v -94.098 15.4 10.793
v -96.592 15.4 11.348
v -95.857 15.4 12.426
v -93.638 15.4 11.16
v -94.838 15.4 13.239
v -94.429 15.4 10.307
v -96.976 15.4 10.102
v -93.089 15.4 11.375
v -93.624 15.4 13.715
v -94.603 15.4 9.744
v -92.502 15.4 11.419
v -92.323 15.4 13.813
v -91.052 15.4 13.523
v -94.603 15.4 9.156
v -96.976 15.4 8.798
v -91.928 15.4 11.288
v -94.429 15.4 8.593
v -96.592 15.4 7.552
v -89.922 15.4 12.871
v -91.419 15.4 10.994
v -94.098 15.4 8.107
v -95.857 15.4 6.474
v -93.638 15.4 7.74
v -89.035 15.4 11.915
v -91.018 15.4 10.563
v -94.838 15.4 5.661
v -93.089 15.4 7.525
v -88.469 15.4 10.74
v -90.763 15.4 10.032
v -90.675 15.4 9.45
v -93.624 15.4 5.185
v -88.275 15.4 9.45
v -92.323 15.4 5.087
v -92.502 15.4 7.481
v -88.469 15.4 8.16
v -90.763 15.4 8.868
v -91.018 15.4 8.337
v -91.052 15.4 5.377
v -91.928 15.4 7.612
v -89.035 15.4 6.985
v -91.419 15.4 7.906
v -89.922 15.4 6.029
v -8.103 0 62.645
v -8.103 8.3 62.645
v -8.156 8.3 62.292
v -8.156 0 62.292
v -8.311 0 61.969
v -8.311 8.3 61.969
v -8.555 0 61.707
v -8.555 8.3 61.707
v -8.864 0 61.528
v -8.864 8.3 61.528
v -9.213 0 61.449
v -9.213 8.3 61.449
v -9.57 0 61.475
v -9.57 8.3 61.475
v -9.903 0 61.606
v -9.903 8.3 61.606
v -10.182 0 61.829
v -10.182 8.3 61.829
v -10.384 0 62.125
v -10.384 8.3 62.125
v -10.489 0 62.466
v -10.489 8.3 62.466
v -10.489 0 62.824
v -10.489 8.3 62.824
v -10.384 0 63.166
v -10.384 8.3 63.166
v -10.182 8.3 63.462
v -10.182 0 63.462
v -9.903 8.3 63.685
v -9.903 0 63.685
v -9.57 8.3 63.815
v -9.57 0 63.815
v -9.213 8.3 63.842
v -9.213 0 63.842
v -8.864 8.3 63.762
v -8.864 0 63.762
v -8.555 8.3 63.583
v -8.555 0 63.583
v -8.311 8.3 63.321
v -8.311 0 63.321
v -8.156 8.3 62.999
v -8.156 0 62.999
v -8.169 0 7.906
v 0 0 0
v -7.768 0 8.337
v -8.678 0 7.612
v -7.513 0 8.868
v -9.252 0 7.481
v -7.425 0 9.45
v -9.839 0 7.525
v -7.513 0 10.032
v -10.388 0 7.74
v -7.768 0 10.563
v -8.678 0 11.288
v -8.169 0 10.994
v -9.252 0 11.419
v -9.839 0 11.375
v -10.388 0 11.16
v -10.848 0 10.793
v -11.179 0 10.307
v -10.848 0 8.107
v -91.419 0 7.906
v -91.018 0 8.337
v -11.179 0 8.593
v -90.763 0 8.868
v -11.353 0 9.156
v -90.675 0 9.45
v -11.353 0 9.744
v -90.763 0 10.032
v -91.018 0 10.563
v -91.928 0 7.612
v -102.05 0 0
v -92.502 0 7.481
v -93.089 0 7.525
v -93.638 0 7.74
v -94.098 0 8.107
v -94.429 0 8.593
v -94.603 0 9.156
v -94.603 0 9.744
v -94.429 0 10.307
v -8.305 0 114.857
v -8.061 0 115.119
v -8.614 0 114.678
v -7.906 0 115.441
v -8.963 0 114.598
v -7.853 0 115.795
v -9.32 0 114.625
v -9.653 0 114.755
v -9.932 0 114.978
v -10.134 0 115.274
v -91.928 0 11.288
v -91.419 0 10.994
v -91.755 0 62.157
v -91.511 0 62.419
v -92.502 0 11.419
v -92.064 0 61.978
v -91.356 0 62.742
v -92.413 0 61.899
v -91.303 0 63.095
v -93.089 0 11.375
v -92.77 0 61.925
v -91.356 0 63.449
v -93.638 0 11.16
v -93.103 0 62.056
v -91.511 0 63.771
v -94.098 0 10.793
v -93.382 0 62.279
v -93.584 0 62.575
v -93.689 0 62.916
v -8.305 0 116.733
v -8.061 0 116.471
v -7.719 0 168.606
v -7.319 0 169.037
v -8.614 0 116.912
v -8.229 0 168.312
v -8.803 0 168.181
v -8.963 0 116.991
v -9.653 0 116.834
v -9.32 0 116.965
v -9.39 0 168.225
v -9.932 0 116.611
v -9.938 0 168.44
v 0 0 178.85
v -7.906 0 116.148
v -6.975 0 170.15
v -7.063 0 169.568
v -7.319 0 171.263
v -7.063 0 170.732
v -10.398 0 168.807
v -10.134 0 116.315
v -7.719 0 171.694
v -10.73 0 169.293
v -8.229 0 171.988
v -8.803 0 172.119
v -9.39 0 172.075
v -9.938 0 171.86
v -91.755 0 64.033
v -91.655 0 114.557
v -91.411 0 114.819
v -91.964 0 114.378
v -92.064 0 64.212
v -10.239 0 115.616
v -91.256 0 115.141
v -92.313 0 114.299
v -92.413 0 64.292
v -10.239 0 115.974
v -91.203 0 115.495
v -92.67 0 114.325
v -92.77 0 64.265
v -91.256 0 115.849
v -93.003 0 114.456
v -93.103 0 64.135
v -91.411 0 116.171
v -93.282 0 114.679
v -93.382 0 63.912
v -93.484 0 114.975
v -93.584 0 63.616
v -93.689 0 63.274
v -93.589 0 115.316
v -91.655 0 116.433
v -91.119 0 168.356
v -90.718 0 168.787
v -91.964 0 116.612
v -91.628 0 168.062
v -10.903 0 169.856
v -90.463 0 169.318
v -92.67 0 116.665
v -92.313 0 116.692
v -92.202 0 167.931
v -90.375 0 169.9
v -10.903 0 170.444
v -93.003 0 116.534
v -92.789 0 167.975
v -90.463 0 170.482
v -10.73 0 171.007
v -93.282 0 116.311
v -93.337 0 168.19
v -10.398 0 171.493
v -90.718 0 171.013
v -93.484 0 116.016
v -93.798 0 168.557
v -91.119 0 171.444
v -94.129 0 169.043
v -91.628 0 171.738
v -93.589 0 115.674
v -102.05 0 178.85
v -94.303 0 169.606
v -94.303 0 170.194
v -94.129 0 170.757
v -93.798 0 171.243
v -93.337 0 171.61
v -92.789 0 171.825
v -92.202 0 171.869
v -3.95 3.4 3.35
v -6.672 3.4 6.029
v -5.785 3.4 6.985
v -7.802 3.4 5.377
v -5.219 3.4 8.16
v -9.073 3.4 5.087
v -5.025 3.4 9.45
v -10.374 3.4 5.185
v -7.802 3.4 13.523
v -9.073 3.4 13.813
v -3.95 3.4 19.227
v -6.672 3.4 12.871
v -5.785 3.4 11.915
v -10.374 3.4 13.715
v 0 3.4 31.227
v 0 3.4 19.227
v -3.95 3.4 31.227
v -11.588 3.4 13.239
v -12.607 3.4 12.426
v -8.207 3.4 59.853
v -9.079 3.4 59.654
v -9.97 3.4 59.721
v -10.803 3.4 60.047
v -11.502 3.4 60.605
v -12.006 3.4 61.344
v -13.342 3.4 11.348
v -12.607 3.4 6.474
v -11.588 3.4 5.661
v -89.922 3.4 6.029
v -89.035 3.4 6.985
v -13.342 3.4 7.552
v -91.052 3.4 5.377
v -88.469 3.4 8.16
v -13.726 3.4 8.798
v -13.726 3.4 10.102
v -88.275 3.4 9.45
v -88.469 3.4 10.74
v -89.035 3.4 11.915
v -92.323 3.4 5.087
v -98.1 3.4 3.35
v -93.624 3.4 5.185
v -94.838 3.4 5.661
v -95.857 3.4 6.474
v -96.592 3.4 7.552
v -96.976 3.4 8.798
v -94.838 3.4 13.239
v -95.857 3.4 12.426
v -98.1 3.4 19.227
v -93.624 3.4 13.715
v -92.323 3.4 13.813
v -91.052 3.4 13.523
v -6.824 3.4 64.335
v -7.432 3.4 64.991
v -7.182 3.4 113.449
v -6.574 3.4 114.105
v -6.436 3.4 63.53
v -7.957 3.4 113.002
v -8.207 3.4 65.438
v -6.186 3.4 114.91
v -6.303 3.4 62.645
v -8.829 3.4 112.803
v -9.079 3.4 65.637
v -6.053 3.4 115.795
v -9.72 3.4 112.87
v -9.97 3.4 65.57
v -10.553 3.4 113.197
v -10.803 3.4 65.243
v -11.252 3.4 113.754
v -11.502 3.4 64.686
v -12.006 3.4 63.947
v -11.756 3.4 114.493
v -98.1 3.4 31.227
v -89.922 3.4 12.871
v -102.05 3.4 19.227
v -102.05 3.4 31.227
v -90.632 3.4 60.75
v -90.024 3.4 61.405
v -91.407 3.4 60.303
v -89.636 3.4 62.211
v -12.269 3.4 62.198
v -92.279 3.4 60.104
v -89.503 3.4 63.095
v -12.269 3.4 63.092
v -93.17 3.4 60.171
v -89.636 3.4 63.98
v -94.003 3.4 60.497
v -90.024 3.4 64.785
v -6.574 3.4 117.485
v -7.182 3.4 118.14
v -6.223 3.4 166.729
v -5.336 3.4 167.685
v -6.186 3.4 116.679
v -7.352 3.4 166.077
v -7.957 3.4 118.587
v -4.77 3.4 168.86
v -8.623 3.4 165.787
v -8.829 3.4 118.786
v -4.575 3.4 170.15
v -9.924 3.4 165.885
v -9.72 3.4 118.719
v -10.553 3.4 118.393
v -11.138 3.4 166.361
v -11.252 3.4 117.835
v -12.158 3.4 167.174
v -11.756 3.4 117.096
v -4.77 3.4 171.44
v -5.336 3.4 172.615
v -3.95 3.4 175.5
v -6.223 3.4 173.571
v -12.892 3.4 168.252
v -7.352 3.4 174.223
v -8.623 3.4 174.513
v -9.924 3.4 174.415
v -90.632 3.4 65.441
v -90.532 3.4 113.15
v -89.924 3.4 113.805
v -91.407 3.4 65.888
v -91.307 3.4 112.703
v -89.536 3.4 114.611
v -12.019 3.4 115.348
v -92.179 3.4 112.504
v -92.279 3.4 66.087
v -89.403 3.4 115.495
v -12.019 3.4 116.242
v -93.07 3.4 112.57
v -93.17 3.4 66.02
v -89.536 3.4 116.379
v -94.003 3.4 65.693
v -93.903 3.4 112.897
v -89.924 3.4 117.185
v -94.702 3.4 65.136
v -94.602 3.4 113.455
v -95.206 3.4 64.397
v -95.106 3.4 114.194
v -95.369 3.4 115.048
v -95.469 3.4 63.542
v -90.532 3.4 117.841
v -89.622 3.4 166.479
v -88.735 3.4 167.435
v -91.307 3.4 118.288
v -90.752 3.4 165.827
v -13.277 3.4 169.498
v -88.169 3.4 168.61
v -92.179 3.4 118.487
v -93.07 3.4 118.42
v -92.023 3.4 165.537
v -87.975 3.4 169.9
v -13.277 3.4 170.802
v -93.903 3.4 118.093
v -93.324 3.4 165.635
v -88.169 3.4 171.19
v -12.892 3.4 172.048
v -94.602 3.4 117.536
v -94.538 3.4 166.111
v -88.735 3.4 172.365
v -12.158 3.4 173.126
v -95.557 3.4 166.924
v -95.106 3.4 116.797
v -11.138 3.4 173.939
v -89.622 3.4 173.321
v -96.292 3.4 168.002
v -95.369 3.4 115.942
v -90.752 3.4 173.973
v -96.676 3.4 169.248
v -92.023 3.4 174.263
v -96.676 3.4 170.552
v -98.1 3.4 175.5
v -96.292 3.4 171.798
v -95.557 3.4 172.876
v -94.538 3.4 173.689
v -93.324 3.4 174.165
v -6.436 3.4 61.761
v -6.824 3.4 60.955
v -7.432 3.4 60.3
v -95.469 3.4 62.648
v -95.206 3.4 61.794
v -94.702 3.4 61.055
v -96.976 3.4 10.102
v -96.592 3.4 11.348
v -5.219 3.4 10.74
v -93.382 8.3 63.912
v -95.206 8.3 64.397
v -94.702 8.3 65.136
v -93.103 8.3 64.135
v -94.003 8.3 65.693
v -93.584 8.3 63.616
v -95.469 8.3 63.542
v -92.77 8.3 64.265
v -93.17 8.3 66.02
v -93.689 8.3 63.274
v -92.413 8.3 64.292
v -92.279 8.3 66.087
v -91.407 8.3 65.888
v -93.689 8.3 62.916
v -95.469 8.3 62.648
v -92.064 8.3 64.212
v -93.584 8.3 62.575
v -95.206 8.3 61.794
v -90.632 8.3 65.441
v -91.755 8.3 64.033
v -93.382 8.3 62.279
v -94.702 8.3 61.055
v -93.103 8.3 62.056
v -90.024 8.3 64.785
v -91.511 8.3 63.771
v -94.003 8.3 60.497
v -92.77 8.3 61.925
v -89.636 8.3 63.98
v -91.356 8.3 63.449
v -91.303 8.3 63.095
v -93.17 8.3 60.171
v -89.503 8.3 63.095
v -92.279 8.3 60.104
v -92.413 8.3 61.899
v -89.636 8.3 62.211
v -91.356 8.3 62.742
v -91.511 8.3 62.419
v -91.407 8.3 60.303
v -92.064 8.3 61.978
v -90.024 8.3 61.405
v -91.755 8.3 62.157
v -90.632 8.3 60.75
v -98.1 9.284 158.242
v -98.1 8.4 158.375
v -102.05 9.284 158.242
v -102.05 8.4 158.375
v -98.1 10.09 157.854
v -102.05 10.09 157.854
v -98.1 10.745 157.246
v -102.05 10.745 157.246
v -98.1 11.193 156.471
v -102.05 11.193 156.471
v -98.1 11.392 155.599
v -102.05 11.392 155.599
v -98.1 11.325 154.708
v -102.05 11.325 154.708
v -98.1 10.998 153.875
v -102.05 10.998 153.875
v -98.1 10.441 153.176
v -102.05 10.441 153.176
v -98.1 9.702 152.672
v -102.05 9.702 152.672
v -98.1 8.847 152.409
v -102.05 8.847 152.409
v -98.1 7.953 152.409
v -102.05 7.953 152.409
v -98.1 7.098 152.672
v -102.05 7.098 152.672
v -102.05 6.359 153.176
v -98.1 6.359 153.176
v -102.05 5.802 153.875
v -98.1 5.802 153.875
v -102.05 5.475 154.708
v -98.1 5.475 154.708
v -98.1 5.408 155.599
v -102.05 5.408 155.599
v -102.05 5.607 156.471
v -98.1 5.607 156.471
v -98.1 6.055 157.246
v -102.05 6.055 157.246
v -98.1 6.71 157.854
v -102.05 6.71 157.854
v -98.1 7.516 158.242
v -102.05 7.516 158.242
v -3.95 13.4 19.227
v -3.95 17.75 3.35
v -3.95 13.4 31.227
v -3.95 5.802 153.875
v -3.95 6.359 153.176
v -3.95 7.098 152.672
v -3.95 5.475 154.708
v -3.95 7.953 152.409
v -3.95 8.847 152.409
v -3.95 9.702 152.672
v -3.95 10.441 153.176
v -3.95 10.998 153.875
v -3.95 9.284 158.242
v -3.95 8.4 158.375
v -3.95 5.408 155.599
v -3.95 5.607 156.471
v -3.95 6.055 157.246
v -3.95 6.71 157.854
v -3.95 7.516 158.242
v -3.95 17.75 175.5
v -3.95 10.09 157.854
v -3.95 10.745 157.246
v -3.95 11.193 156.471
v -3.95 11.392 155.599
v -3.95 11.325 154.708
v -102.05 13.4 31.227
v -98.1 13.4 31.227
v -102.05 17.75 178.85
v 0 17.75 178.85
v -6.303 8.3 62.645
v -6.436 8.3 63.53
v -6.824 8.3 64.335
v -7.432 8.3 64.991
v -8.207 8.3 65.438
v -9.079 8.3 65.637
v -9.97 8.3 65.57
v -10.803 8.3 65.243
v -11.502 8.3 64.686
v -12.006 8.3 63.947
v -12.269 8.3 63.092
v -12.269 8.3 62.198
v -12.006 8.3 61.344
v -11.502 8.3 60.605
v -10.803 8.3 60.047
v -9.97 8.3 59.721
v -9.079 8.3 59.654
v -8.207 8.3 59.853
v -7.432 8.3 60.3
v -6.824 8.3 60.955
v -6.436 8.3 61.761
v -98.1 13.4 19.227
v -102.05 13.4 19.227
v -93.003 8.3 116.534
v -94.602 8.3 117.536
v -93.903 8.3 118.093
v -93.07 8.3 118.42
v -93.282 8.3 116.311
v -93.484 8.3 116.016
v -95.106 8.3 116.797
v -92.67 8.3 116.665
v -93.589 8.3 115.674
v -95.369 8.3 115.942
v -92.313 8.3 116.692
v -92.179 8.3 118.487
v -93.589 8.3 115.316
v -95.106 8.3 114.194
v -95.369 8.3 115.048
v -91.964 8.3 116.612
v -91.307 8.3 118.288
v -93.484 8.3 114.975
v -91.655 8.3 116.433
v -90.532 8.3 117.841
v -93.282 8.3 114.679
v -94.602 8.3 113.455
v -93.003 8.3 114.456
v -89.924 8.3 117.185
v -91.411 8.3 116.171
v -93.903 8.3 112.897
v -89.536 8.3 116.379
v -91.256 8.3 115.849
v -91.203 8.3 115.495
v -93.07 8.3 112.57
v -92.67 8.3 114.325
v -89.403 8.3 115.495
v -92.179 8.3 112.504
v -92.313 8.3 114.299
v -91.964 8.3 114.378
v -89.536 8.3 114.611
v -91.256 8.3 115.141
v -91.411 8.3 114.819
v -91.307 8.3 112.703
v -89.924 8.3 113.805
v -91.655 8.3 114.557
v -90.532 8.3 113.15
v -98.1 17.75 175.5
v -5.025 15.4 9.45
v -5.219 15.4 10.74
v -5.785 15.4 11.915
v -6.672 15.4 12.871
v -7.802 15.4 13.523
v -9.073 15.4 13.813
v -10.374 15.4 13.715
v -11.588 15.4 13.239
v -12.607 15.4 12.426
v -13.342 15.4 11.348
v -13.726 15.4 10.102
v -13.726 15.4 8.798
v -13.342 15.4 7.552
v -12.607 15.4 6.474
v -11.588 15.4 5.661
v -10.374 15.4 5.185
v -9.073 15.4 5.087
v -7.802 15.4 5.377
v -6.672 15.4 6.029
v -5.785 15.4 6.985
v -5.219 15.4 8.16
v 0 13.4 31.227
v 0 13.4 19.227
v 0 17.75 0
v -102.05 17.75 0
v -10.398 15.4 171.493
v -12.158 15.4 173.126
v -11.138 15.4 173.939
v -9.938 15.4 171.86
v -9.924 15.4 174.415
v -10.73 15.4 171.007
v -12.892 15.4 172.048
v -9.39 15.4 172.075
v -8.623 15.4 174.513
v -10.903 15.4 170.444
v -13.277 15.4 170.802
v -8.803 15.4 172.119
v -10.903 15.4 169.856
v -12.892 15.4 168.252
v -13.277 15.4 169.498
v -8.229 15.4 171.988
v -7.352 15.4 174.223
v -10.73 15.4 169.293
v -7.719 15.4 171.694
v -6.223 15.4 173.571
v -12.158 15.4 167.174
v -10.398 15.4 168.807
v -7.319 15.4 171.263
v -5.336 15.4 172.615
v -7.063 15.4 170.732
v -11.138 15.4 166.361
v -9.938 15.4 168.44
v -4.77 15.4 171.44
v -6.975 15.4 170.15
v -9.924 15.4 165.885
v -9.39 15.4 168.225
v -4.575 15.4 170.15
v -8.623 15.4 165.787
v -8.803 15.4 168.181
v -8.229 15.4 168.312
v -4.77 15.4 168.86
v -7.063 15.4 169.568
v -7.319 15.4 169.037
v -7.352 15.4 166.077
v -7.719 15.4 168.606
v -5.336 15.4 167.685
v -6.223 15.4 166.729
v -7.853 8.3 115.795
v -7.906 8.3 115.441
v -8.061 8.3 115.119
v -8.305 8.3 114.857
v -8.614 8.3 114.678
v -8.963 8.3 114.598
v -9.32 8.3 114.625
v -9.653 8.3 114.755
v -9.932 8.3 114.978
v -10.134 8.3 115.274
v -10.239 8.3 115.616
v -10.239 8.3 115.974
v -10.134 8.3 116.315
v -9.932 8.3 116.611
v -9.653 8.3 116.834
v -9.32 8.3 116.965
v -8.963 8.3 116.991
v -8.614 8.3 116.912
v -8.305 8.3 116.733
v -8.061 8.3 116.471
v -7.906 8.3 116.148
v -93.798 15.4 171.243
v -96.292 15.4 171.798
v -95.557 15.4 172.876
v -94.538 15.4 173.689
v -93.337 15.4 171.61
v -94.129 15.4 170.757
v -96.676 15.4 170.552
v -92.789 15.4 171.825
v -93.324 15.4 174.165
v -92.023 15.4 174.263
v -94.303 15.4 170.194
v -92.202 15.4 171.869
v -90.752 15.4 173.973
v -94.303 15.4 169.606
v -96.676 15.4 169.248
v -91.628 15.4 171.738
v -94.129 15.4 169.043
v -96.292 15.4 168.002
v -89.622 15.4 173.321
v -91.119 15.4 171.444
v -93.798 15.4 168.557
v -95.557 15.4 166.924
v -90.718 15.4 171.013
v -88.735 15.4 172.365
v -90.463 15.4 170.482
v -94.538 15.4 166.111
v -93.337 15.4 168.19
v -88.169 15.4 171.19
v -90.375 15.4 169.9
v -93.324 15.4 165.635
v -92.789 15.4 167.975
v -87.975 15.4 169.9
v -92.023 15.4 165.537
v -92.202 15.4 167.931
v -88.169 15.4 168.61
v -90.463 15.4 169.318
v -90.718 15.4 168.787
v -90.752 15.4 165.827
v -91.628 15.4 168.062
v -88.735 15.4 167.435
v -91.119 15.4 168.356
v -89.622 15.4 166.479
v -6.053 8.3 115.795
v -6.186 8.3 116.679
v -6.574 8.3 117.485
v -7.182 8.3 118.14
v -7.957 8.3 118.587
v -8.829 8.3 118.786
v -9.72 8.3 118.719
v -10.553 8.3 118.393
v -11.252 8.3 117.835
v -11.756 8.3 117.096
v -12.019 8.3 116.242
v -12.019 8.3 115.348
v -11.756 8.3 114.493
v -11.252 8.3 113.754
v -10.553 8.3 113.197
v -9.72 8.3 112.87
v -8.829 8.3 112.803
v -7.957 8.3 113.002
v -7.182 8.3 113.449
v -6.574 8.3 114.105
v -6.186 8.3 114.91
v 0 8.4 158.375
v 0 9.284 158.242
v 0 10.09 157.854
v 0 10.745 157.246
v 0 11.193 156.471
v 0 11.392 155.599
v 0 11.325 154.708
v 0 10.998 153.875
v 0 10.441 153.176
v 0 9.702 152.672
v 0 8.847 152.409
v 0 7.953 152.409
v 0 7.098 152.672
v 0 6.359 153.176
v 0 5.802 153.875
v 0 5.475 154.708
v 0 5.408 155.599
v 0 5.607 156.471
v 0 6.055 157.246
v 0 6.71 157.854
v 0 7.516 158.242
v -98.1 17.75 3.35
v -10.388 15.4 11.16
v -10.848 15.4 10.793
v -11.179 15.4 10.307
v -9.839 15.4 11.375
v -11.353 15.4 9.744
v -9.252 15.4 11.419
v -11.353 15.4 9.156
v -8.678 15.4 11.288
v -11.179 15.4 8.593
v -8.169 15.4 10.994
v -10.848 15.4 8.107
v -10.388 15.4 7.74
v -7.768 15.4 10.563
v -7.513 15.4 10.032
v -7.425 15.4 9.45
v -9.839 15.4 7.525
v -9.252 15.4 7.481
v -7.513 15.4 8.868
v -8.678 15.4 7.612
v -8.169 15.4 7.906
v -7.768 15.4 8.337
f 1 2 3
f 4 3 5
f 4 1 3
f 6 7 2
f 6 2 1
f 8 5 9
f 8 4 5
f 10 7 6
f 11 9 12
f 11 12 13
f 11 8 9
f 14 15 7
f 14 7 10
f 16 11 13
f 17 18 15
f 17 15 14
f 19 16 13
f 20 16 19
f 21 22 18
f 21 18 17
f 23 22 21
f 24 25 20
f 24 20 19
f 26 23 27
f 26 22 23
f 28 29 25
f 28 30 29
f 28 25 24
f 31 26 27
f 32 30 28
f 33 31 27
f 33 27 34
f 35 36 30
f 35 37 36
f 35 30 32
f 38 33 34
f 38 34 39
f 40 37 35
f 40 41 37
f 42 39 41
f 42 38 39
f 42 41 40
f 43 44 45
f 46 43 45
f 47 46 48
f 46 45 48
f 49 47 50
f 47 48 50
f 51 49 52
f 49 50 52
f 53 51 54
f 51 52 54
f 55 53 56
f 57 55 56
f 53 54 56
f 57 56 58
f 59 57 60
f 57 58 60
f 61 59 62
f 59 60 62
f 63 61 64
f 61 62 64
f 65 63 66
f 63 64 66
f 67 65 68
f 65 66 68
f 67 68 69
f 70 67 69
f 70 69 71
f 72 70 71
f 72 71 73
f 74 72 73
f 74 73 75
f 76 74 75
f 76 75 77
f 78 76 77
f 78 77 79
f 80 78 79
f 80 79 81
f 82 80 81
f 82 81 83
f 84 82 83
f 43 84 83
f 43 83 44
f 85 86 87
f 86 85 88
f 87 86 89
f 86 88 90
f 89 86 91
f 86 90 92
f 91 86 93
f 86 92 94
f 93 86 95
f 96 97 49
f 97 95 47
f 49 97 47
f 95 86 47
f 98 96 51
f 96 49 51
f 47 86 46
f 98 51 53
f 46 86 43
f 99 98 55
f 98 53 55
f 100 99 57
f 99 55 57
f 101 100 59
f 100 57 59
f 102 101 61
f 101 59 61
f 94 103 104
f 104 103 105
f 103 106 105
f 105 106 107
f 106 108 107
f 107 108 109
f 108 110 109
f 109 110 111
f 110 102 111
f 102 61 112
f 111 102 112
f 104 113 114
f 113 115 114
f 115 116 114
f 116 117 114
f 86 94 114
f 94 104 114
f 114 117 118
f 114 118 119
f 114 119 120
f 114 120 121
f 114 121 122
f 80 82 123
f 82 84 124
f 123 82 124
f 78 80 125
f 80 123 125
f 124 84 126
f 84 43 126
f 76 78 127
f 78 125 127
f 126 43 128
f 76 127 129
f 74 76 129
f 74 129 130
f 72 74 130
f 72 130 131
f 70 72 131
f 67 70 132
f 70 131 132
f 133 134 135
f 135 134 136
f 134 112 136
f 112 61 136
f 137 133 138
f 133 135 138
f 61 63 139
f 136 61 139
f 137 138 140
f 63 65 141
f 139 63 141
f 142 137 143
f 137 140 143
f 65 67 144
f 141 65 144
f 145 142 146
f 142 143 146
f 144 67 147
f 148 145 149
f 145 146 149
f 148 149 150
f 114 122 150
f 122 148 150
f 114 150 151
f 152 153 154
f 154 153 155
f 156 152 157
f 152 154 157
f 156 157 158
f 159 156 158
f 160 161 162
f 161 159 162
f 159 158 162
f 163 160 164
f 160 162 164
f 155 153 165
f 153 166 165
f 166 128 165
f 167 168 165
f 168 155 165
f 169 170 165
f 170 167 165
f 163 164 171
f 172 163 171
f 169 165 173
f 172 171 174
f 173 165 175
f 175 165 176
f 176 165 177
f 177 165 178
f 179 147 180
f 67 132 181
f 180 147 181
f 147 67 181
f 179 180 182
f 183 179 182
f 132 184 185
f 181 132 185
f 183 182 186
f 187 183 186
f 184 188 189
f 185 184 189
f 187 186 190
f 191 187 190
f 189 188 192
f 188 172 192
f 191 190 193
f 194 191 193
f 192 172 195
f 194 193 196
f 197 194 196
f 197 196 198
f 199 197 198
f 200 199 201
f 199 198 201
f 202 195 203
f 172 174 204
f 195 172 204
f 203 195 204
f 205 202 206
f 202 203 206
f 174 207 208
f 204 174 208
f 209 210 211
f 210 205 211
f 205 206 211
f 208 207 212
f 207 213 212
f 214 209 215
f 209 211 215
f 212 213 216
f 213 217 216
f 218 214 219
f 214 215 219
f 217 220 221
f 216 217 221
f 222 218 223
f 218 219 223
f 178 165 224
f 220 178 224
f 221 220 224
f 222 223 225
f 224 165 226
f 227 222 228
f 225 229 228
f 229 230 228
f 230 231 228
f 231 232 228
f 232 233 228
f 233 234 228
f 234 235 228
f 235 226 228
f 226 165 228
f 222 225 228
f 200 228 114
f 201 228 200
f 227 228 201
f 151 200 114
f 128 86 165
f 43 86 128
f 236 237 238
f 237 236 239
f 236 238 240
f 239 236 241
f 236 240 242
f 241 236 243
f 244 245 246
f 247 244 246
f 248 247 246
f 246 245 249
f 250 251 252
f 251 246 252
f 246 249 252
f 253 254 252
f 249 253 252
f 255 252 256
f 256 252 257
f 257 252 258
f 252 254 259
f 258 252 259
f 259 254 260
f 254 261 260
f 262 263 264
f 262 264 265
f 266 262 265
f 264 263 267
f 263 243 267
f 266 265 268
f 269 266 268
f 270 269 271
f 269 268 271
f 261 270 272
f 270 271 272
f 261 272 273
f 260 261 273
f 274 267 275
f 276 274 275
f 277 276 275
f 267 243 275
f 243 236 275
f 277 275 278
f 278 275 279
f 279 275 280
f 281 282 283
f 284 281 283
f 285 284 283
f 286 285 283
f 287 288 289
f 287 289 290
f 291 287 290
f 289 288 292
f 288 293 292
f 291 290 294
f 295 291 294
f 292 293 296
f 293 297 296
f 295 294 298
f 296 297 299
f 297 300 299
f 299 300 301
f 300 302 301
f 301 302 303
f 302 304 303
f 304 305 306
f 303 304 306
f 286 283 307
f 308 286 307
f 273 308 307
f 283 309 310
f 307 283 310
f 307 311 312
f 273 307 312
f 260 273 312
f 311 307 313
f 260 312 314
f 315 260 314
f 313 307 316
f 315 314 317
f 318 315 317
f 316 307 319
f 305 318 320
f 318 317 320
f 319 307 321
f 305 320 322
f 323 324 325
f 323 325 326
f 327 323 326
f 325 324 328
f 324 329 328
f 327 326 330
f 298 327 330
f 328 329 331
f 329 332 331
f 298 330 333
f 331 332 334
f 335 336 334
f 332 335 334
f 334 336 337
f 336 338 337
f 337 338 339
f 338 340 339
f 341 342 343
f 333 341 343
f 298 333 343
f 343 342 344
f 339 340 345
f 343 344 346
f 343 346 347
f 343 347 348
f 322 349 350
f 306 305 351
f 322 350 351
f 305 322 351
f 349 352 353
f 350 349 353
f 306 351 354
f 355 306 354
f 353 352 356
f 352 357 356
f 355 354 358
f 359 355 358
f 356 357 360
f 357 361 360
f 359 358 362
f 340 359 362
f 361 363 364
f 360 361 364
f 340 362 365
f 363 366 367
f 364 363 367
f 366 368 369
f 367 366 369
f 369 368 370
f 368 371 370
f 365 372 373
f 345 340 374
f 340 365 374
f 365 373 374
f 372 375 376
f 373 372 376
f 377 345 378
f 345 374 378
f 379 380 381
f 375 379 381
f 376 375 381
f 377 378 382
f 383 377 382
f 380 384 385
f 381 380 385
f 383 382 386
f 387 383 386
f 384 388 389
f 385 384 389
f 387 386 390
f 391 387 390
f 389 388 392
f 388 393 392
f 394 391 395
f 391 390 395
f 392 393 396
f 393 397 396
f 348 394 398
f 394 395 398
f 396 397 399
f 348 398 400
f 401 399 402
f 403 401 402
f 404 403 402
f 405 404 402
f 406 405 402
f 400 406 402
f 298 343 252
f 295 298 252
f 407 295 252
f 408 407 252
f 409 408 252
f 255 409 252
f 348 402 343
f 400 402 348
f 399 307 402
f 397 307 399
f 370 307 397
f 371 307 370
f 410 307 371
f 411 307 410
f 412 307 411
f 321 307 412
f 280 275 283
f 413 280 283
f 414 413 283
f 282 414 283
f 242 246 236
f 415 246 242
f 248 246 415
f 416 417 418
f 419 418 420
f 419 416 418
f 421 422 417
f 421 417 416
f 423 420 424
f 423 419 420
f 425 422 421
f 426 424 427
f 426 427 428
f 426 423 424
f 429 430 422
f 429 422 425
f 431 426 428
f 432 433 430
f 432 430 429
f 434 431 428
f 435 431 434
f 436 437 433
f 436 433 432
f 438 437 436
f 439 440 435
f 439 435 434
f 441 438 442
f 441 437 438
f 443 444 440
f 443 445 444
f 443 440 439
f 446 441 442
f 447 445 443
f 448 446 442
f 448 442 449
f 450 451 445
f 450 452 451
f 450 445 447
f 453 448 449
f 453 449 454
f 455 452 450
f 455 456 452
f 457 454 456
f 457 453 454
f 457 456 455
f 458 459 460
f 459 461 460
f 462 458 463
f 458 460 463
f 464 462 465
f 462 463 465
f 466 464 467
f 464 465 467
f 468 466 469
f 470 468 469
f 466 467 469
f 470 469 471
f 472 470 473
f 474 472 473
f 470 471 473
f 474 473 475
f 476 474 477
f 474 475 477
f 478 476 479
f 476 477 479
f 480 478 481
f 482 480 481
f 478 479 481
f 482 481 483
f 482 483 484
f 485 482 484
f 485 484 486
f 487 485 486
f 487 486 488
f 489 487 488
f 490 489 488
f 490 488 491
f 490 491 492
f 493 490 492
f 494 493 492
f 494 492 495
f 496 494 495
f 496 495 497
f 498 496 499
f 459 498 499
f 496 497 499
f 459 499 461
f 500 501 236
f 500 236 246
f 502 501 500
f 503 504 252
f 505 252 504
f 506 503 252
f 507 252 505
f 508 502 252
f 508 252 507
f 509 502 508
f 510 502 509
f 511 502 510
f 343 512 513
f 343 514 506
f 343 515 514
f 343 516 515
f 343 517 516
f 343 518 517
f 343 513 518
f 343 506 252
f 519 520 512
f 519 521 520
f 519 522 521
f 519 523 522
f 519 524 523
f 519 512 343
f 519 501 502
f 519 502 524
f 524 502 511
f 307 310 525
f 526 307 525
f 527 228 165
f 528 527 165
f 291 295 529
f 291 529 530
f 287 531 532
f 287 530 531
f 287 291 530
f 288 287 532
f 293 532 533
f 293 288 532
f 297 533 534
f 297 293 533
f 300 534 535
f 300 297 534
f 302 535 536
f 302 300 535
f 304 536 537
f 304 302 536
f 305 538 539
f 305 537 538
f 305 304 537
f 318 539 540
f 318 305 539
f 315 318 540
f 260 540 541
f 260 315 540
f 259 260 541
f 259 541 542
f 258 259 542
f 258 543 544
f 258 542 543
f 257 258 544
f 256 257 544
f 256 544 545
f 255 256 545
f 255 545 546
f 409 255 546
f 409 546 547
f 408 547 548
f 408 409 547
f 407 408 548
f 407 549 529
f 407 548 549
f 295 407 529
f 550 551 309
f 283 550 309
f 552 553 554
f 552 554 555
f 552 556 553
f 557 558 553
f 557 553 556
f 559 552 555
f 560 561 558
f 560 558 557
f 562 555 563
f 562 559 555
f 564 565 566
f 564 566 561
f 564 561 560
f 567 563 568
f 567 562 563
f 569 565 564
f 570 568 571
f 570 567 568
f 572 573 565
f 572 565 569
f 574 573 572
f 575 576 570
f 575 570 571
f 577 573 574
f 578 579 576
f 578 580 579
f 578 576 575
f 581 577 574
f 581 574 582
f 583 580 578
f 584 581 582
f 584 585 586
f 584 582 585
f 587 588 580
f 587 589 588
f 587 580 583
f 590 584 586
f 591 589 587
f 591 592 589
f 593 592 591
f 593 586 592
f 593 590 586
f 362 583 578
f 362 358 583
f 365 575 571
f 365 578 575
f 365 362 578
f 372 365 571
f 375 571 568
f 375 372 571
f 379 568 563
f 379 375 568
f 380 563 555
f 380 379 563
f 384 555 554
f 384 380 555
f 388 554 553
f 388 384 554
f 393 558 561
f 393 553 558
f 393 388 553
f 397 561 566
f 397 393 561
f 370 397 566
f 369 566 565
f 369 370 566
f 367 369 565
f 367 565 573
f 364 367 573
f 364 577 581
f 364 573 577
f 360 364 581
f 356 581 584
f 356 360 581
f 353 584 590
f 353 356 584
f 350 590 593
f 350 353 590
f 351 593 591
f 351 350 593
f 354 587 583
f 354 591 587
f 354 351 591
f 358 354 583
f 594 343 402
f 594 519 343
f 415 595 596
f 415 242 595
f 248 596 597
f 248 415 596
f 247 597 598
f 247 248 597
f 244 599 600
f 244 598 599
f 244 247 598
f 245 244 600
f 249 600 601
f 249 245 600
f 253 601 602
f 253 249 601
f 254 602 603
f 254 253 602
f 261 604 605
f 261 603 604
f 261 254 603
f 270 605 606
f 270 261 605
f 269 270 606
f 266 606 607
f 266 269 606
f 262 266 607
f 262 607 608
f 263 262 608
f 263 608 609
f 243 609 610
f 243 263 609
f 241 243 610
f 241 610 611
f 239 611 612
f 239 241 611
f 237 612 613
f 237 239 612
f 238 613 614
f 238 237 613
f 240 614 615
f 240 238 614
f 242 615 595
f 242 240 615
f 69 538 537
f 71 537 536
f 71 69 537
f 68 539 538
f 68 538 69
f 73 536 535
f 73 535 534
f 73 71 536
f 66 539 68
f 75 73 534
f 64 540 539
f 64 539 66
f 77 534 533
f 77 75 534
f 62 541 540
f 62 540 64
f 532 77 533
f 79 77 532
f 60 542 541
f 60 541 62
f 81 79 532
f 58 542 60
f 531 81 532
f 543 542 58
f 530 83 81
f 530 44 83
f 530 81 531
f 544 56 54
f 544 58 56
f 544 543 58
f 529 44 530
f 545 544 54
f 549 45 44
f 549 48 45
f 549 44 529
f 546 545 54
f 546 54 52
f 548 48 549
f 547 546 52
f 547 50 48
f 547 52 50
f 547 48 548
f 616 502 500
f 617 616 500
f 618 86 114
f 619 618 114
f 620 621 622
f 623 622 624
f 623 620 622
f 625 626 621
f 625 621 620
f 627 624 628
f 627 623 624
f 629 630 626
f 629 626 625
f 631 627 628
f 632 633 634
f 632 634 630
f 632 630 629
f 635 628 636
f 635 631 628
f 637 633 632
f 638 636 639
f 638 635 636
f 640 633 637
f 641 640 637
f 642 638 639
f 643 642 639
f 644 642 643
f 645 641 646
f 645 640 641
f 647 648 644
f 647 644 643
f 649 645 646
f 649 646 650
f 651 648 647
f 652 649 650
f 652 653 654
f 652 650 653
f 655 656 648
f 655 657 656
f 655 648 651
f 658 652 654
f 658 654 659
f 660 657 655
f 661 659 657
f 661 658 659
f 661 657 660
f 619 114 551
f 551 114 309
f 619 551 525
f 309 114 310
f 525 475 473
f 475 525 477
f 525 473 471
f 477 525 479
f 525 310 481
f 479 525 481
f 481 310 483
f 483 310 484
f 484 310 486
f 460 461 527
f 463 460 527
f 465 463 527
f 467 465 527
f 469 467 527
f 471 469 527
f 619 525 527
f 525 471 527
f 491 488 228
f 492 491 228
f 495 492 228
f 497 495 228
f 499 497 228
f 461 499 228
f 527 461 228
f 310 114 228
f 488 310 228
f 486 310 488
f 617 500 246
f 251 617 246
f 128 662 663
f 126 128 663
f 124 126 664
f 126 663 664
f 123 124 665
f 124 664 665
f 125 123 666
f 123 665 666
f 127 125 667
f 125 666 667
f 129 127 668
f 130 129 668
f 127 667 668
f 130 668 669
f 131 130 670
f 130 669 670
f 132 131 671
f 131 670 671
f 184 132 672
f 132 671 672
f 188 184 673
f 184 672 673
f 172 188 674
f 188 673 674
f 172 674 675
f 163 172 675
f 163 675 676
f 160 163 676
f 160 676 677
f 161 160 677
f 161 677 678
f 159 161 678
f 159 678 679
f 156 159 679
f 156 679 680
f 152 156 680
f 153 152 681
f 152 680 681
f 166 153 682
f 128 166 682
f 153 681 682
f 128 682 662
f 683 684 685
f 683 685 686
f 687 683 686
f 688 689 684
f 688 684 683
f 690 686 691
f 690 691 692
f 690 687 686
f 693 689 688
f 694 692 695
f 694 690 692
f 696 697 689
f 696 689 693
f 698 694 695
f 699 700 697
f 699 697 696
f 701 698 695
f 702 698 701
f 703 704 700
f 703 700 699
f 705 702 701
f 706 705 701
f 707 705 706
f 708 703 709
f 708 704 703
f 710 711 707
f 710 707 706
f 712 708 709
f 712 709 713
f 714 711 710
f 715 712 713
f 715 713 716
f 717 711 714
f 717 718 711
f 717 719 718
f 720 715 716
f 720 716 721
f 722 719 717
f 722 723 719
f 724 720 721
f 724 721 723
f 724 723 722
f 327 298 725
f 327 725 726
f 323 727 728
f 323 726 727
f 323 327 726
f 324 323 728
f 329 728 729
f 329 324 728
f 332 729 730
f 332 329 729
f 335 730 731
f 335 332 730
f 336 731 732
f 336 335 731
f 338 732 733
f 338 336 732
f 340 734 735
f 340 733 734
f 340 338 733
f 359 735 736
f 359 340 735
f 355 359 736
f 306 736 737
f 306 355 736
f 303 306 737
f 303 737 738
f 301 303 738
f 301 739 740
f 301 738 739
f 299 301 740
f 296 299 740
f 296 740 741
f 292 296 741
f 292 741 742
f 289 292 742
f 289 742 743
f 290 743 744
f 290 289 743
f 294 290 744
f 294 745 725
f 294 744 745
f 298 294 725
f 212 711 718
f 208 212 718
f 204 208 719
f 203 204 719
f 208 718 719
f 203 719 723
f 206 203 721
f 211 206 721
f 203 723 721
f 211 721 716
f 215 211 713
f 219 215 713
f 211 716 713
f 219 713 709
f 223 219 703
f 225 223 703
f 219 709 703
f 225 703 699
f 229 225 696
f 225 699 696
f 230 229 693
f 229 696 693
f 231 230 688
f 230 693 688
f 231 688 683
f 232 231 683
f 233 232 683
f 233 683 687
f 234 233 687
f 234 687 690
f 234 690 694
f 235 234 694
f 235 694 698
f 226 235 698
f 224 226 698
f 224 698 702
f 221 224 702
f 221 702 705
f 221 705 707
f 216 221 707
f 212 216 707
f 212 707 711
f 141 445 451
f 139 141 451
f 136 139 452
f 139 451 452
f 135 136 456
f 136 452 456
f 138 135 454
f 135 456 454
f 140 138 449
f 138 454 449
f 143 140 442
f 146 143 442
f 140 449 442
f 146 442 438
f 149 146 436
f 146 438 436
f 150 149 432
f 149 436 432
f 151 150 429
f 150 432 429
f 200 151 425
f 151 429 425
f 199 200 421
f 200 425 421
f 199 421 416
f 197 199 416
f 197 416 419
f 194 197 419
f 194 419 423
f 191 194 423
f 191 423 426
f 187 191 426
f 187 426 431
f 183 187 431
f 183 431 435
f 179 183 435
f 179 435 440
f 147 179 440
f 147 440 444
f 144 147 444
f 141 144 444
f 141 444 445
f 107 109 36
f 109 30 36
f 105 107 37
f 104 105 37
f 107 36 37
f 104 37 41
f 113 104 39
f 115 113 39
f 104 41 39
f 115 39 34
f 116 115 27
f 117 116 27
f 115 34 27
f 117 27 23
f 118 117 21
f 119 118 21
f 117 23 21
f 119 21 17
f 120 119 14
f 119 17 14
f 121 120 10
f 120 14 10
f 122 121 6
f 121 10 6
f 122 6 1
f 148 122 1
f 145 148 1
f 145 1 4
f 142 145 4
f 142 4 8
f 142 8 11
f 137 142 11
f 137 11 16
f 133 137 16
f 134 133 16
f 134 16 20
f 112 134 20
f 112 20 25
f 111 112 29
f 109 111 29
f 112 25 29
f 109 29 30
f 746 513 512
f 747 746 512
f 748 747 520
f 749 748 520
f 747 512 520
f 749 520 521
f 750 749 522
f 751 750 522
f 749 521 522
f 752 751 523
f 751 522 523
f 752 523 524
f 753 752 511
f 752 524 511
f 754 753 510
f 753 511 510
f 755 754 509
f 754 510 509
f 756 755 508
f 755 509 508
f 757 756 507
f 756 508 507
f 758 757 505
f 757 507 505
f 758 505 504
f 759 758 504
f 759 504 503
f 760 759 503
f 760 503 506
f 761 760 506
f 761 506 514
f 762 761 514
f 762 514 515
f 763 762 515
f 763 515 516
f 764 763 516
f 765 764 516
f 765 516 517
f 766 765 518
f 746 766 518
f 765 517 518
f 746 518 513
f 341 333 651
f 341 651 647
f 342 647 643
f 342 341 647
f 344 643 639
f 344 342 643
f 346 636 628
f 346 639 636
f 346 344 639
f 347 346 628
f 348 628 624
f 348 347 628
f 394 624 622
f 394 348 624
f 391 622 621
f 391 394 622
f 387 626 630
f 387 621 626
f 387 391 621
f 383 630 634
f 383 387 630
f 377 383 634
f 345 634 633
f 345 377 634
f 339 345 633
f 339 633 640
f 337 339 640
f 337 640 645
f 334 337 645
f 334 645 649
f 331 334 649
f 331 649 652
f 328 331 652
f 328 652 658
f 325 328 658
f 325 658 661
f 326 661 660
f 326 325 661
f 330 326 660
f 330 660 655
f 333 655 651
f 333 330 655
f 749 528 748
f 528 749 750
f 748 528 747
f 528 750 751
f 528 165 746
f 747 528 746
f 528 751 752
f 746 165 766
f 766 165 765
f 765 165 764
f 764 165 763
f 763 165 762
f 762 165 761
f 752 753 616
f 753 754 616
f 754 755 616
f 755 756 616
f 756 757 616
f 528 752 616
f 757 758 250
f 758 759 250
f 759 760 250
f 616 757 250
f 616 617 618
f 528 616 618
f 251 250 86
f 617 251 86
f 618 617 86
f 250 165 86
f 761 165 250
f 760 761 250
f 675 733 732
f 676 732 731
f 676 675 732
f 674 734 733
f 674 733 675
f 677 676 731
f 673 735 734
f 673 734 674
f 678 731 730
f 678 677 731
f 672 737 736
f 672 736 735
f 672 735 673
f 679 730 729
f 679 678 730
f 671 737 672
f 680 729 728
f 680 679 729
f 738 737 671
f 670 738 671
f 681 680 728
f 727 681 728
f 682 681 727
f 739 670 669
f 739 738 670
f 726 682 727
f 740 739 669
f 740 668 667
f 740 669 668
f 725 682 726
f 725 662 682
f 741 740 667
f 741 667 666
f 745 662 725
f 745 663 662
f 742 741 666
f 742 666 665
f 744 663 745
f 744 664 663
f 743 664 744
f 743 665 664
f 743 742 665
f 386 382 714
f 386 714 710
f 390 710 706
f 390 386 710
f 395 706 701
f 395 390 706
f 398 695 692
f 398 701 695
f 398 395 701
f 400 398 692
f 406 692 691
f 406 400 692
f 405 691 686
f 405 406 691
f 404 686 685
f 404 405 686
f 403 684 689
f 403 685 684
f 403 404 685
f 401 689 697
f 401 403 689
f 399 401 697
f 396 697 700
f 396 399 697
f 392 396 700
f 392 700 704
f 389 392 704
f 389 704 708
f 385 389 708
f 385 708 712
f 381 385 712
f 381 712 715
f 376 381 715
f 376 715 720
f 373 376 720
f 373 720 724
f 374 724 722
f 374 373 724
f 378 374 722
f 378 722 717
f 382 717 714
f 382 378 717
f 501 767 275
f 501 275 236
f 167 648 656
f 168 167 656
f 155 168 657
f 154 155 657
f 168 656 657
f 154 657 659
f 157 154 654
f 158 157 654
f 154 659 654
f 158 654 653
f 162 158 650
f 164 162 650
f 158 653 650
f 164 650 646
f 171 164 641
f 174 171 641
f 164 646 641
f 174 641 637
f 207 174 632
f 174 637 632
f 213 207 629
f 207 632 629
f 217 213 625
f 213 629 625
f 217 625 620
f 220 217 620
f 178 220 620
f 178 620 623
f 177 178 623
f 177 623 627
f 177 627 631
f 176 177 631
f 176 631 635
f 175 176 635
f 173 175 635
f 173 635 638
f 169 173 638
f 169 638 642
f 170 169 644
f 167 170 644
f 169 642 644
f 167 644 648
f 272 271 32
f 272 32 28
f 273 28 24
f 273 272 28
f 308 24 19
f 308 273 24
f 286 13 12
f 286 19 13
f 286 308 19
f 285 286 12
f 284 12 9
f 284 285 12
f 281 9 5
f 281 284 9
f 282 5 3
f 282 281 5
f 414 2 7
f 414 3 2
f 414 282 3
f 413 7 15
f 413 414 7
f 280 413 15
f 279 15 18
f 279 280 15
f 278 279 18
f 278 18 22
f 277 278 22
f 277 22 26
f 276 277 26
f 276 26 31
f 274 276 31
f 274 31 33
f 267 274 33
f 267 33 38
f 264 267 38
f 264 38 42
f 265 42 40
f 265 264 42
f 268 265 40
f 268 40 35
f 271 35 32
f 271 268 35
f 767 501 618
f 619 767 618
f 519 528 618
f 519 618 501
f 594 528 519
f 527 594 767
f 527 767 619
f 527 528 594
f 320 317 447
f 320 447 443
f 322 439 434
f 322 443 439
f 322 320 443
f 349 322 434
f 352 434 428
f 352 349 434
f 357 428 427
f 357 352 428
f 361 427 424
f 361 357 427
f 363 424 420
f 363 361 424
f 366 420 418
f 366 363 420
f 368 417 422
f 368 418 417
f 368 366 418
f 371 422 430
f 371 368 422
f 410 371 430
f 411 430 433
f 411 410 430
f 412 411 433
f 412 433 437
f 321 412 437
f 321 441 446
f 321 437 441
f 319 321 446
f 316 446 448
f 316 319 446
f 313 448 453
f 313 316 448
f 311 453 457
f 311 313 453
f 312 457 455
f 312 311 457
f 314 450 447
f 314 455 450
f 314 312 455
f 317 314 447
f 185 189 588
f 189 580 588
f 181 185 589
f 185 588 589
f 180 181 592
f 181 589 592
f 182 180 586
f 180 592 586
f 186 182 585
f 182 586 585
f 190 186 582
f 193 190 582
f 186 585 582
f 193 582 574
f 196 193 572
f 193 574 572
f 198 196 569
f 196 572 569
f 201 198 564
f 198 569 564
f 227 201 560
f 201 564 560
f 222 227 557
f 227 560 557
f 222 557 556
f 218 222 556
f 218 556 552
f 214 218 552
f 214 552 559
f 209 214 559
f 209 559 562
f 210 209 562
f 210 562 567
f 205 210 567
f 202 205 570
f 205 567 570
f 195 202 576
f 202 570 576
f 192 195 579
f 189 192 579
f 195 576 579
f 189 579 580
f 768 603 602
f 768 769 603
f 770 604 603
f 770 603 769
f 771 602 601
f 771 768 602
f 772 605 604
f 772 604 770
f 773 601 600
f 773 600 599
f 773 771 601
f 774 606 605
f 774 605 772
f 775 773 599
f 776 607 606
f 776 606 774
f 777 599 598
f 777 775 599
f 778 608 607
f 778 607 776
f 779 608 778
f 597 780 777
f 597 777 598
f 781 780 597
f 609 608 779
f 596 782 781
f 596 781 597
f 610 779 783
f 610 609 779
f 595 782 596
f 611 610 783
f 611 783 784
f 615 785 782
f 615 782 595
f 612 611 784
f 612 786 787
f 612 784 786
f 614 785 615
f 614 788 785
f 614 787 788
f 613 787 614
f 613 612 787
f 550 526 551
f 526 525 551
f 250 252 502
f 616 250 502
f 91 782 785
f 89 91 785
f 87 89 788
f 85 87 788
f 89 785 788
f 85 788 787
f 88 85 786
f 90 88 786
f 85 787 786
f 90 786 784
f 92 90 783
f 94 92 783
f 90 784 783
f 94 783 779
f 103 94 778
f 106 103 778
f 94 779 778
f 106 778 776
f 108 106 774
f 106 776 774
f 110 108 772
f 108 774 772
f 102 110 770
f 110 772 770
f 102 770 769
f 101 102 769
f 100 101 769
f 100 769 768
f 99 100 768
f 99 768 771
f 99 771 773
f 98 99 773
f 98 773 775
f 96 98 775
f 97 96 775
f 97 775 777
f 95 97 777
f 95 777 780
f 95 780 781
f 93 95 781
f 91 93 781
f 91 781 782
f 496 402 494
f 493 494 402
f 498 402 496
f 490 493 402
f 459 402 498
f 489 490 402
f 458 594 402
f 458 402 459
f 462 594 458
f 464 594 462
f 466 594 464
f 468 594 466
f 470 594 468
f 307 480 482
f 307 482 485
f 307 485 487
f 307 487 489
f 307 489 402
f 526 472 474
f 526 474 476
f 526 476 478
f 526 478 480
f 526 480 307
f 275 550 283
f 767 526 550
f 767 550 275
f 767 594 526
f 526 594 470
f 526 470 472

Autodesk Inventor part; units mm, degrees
ref_plane "YZ Plane" through (0, 0, 0) normal (1, 0, 0) x (0, 1, 0)
ref_plane "XZ Plane" through (0, 0, 0) normal (0, 1, 0) x (-1, 0, 0)
ref_plane "XY Plane" through (0, 0, 0) normal (0, 0, 1) x (1, 0, 0)
sketch "Szkic1" plane through (0, 0, 0) normal (0, 1, 0) x (-1, 0, 0)
  line L0 (0, 0) -> (102.05, 0)
  line L1 (102.05, 0) -> (102.05, 178.85)
  line L2 (102.05, 178.85) -> (0, 178.85)
  line L3 (0, 178.85) -> (0, 0)
  dimension "d0" = 178.85
  dimension "d1" = 102.05
extrude "Wyciągnięcie proste1" add sketch "Szkic1" along normal blind 17.75
sketch "Szkic2" plane through (0, 17.75, 0) normal (0, 1, 0) x (1, 0, 0)
  line L0 (-98.1, -3.35) -> (-3.95, -3.35)
  line L1 (-3.95, -3.35) -> (-3.95, -175.5)
  line L2 (-3.95, -175.5) -> (-98.1, -175.5)
  line L3 (-98.1, -175.5) -> (-98.1, -3.35)
  line L4 (-102.05, -178.85) -> (0, -178.85) projected
  line L5 (0, 0) -> (-102.05, 0) projected
  line L6 (-102.05, 0) -> (-102.05, -178.85) projected
  line L7 (0, -178.85) -> (0, 0) projected
  dimension "d4" = 3.35
  dimension "d5" = 3.35
  dimension "d6" = 3.95
  dimension "d7" = 3.95
extrude "Wyciągnięcie proste2" cut sketch "Szkic2" against normal blind 14.35 contours L0 L1 L2 L3
sketch "Szkic3" plane through (0, 3.4, 0) normal (0, 1, 0) x (1, 0, 0)
  circle A0 centre (-9.4, -9.45) radius 4.375
  circle A1 centre (-92.65, -9.45) radius 4.375
  circle A2 centre (-92.5, -63.1) radius 3
  circle A3 centre (-9.3, -62.65) radius 3
  circle A4 centre (-92.4, -115.4999) radius 3
  circle A5 centre (-9.05, -115.7994) radius 3
  circle A6 centre (-92.35, -169.9) radius 4.375
  circle A7 centre (-8.9504, -170.15) radius 4.375
  line L0 (-102.05, 0) -> (-102.05, -178.85) projected
  line L1 (0, 0) -> (-102.05, 0) projected
  line L2 (0, -178.85) -> (0, 0) projected
  line L3 (-98.1, -175.5) -> (-98.1, -3.35) projected
  line L4 (-3.95, -3.35) -> (-3.95, -175.5) projected
  dimension "d10" = 8.75
  dimension "d11" = 8.75
  dimension "d12" = 6
  dimension "d13" = 6
  dimension "d14" = 6
  dimension "d15" = 6
  dimension "d16" = 8.75
  dimension "d17" = 8.75
  dimension "d18" = 9.4
  dimension "d19" = 9.45
  dimension "d20" = 9.45
  dimension "d21" = 9.4
  dimension "d23" = 63.1
  dimension "d25" = 62.65
  dimension "d27" = 52.4
  dimension "d29" = 53.15
  dimension "d30" = 83.2
  dimension "d31" = 102.05
  dimension "d32" = 9.55
  dimension "d33" = 9.65
  dimension "d34" = 83.35
  dimension "d35" = 83.4
  dimension "d36" = 9.7
  dimension "d37" = 160.45
  dimension "d38" = 160.7
extrude "Wyciągnięcie proste3" add sketch "Szkic3" along normal blind 12 contours A0 | A1 | A6 | A7
sketch "Szkic4" plane through (-0.0028, 3.4, -0.0047) normal (0, 1, 0) x (1, 0, 0)
  circle A0 centre (-9.4, -9.45) radius 4.375
  circle A1 centre (-92.65, -9.45) radius 4.375
  circle A2 centre (-92.5, -63.1) radius 3
  circle A3 centre (-9.3, -62.65) radius 3
  circle A4 centre (-92.4, -115.4999) radius 3
  circle A5 centre (-9.05, -115.7994) radius 3
  circle A6 centre (-92.35, -169.9) radius 4.375
  circle A7 centre (-8.9504, -170.15) radius 4.375
  line L0 (-102.05, 0) -> (-102.05, -178.85)
  line L1 (0, 0) -> (-102.05, 0)
  line L2 (0, -178.85) -> (0, 0)
  line L3 (-98.1, -175.5) -> (-98.1, -3.35)
  line L4 (-3.95, -3.35) -> (-3.95, -175.5)
  dimension "d59" = 8.75
  dimension "d62" = 8.75
  dimension "d56" = 6
  dimension "d53" = 6
  dimension "d47" = 6
  dimension "d50" = 6
  dimension "d44" = 8.75
  dimension "d41" = 8.75
  dimension "d61" = 9.4
  dimension "d60" = 9.45
  dimension "d64" = 9.45
  dimension "d63" = 9.4
  dimension "d58" = 63.1
  dimension "d55" = 62.65
  dimension "d52" = 52.4
  dimension "d49" = 53.15
  dimension "d54" = 83.2
  dimension "d68" = 102.05
  dimension "d57" = 9.55
  dimension "d51" = 9.65
  dimension "d48" = 83.35
  dimension "d43" = 83.4
  dimension "d46" = 9.7
  dimension "d45" = 160.45
  dimension "d42" = 160.7
extrude "Wyciągnięcie proste4" add sketch "Szkic4" along normal blind 4.9 contours A2 | A3 | A4 | A5
sketch "Szkic5" plane through (-92.65, 15.4, 9.45) normal (0, 1, 0) x (1, 0, 0)
  circle A0 centre (0, 0) radius 1.975
  circle A1 centre (83.25, 0) radius 4.375 projected
  circle A2 centre (83.25, 0) radius 1.975
  circle A3 centre (0.1472, -53.6453) radius 3 projected
  circle A4 centre (0.1472, -53.6453) radius 1.2
  circle A5 centre (83.3472, -53.1953) radius 3 projected
  circle A6 centre (83.3472, -53.1953) radius 1.2
  circle A7 centre (0.2472, -106.0452) radius 3 projected
  circle A8 centre (0.2472, -106.0452) radius 1.2
  circle A9 centre (83.5972, -106.3447) radius 3 projected
  circle A10 centre (83.5972, -106.3447) radius 1.2
  circle A11 centre (0.3, -160.45) radius 4.375 projected
  circle A12 centre (0.3, -160.45) radius 1.975
  circle A13 centre (83.6996, -160.7) radius 4.375 projected
  circle A14 centre (83.6996, -160.7) radius 1.975
  point P0 (92.65, 9.45)
  dimension "d69" = 3.95
  dimension "d70" = 3.95
  dimension "d71" = 2.4
  dimension "d72" = 2.4
  dimension "d73" = 2.4
  dimension "d74" = 2.4
  dimension "d75" = 3.95
  dimension "d76" = 3.95
extrude "Wyciągnięcie proste5" cut sketch "Szkic5" against normal through all contours A0 | A2 | A4 | A6 | A8 | A10 | A12 | A14
sketch "Szkic6" plane through (-98.1, 17.75, 175.5) normal (1, 0, 0) x (0, 0, -1)
  line L0 (144.273, -4.35) -> (156.273, -4.35)
  line L1 (156.273, -4.35) -> (156.273, -14.35)
  line L2 (156.273, -14.35) -> (144.273, -14.35)
  line L3 (144.273, -14.35) -> (144.273, -4.35)
  line L4 (0, -14.35) -> (172.15, -14.35) projected
  point P0 (175.5, -17.75)
  dimension "d79" = 10
  dimension "d80" = 12
extrude "Wyciągnięcie proste6" cut sketch "Szkic6" along normal through all both and the other way through all
sketch "Szkic7" plane through (-102.05, 0, 0) normal (-1, 0, 0) x (0, 0, 1)
  circle A0 centre (155.3753, 8.4) radius 3
  line L0 (19.227, 3.4) -> (19.227, 13.4) projected
  point P0 (0, 0)
  point P1 (19.227, 8.4)
  dimension "d83" = 6
extrude "Wyciągnięcie proste7" cut sketch "Szkic7" along normal through all both and the other way through all
properties part number "pudelko dol"
